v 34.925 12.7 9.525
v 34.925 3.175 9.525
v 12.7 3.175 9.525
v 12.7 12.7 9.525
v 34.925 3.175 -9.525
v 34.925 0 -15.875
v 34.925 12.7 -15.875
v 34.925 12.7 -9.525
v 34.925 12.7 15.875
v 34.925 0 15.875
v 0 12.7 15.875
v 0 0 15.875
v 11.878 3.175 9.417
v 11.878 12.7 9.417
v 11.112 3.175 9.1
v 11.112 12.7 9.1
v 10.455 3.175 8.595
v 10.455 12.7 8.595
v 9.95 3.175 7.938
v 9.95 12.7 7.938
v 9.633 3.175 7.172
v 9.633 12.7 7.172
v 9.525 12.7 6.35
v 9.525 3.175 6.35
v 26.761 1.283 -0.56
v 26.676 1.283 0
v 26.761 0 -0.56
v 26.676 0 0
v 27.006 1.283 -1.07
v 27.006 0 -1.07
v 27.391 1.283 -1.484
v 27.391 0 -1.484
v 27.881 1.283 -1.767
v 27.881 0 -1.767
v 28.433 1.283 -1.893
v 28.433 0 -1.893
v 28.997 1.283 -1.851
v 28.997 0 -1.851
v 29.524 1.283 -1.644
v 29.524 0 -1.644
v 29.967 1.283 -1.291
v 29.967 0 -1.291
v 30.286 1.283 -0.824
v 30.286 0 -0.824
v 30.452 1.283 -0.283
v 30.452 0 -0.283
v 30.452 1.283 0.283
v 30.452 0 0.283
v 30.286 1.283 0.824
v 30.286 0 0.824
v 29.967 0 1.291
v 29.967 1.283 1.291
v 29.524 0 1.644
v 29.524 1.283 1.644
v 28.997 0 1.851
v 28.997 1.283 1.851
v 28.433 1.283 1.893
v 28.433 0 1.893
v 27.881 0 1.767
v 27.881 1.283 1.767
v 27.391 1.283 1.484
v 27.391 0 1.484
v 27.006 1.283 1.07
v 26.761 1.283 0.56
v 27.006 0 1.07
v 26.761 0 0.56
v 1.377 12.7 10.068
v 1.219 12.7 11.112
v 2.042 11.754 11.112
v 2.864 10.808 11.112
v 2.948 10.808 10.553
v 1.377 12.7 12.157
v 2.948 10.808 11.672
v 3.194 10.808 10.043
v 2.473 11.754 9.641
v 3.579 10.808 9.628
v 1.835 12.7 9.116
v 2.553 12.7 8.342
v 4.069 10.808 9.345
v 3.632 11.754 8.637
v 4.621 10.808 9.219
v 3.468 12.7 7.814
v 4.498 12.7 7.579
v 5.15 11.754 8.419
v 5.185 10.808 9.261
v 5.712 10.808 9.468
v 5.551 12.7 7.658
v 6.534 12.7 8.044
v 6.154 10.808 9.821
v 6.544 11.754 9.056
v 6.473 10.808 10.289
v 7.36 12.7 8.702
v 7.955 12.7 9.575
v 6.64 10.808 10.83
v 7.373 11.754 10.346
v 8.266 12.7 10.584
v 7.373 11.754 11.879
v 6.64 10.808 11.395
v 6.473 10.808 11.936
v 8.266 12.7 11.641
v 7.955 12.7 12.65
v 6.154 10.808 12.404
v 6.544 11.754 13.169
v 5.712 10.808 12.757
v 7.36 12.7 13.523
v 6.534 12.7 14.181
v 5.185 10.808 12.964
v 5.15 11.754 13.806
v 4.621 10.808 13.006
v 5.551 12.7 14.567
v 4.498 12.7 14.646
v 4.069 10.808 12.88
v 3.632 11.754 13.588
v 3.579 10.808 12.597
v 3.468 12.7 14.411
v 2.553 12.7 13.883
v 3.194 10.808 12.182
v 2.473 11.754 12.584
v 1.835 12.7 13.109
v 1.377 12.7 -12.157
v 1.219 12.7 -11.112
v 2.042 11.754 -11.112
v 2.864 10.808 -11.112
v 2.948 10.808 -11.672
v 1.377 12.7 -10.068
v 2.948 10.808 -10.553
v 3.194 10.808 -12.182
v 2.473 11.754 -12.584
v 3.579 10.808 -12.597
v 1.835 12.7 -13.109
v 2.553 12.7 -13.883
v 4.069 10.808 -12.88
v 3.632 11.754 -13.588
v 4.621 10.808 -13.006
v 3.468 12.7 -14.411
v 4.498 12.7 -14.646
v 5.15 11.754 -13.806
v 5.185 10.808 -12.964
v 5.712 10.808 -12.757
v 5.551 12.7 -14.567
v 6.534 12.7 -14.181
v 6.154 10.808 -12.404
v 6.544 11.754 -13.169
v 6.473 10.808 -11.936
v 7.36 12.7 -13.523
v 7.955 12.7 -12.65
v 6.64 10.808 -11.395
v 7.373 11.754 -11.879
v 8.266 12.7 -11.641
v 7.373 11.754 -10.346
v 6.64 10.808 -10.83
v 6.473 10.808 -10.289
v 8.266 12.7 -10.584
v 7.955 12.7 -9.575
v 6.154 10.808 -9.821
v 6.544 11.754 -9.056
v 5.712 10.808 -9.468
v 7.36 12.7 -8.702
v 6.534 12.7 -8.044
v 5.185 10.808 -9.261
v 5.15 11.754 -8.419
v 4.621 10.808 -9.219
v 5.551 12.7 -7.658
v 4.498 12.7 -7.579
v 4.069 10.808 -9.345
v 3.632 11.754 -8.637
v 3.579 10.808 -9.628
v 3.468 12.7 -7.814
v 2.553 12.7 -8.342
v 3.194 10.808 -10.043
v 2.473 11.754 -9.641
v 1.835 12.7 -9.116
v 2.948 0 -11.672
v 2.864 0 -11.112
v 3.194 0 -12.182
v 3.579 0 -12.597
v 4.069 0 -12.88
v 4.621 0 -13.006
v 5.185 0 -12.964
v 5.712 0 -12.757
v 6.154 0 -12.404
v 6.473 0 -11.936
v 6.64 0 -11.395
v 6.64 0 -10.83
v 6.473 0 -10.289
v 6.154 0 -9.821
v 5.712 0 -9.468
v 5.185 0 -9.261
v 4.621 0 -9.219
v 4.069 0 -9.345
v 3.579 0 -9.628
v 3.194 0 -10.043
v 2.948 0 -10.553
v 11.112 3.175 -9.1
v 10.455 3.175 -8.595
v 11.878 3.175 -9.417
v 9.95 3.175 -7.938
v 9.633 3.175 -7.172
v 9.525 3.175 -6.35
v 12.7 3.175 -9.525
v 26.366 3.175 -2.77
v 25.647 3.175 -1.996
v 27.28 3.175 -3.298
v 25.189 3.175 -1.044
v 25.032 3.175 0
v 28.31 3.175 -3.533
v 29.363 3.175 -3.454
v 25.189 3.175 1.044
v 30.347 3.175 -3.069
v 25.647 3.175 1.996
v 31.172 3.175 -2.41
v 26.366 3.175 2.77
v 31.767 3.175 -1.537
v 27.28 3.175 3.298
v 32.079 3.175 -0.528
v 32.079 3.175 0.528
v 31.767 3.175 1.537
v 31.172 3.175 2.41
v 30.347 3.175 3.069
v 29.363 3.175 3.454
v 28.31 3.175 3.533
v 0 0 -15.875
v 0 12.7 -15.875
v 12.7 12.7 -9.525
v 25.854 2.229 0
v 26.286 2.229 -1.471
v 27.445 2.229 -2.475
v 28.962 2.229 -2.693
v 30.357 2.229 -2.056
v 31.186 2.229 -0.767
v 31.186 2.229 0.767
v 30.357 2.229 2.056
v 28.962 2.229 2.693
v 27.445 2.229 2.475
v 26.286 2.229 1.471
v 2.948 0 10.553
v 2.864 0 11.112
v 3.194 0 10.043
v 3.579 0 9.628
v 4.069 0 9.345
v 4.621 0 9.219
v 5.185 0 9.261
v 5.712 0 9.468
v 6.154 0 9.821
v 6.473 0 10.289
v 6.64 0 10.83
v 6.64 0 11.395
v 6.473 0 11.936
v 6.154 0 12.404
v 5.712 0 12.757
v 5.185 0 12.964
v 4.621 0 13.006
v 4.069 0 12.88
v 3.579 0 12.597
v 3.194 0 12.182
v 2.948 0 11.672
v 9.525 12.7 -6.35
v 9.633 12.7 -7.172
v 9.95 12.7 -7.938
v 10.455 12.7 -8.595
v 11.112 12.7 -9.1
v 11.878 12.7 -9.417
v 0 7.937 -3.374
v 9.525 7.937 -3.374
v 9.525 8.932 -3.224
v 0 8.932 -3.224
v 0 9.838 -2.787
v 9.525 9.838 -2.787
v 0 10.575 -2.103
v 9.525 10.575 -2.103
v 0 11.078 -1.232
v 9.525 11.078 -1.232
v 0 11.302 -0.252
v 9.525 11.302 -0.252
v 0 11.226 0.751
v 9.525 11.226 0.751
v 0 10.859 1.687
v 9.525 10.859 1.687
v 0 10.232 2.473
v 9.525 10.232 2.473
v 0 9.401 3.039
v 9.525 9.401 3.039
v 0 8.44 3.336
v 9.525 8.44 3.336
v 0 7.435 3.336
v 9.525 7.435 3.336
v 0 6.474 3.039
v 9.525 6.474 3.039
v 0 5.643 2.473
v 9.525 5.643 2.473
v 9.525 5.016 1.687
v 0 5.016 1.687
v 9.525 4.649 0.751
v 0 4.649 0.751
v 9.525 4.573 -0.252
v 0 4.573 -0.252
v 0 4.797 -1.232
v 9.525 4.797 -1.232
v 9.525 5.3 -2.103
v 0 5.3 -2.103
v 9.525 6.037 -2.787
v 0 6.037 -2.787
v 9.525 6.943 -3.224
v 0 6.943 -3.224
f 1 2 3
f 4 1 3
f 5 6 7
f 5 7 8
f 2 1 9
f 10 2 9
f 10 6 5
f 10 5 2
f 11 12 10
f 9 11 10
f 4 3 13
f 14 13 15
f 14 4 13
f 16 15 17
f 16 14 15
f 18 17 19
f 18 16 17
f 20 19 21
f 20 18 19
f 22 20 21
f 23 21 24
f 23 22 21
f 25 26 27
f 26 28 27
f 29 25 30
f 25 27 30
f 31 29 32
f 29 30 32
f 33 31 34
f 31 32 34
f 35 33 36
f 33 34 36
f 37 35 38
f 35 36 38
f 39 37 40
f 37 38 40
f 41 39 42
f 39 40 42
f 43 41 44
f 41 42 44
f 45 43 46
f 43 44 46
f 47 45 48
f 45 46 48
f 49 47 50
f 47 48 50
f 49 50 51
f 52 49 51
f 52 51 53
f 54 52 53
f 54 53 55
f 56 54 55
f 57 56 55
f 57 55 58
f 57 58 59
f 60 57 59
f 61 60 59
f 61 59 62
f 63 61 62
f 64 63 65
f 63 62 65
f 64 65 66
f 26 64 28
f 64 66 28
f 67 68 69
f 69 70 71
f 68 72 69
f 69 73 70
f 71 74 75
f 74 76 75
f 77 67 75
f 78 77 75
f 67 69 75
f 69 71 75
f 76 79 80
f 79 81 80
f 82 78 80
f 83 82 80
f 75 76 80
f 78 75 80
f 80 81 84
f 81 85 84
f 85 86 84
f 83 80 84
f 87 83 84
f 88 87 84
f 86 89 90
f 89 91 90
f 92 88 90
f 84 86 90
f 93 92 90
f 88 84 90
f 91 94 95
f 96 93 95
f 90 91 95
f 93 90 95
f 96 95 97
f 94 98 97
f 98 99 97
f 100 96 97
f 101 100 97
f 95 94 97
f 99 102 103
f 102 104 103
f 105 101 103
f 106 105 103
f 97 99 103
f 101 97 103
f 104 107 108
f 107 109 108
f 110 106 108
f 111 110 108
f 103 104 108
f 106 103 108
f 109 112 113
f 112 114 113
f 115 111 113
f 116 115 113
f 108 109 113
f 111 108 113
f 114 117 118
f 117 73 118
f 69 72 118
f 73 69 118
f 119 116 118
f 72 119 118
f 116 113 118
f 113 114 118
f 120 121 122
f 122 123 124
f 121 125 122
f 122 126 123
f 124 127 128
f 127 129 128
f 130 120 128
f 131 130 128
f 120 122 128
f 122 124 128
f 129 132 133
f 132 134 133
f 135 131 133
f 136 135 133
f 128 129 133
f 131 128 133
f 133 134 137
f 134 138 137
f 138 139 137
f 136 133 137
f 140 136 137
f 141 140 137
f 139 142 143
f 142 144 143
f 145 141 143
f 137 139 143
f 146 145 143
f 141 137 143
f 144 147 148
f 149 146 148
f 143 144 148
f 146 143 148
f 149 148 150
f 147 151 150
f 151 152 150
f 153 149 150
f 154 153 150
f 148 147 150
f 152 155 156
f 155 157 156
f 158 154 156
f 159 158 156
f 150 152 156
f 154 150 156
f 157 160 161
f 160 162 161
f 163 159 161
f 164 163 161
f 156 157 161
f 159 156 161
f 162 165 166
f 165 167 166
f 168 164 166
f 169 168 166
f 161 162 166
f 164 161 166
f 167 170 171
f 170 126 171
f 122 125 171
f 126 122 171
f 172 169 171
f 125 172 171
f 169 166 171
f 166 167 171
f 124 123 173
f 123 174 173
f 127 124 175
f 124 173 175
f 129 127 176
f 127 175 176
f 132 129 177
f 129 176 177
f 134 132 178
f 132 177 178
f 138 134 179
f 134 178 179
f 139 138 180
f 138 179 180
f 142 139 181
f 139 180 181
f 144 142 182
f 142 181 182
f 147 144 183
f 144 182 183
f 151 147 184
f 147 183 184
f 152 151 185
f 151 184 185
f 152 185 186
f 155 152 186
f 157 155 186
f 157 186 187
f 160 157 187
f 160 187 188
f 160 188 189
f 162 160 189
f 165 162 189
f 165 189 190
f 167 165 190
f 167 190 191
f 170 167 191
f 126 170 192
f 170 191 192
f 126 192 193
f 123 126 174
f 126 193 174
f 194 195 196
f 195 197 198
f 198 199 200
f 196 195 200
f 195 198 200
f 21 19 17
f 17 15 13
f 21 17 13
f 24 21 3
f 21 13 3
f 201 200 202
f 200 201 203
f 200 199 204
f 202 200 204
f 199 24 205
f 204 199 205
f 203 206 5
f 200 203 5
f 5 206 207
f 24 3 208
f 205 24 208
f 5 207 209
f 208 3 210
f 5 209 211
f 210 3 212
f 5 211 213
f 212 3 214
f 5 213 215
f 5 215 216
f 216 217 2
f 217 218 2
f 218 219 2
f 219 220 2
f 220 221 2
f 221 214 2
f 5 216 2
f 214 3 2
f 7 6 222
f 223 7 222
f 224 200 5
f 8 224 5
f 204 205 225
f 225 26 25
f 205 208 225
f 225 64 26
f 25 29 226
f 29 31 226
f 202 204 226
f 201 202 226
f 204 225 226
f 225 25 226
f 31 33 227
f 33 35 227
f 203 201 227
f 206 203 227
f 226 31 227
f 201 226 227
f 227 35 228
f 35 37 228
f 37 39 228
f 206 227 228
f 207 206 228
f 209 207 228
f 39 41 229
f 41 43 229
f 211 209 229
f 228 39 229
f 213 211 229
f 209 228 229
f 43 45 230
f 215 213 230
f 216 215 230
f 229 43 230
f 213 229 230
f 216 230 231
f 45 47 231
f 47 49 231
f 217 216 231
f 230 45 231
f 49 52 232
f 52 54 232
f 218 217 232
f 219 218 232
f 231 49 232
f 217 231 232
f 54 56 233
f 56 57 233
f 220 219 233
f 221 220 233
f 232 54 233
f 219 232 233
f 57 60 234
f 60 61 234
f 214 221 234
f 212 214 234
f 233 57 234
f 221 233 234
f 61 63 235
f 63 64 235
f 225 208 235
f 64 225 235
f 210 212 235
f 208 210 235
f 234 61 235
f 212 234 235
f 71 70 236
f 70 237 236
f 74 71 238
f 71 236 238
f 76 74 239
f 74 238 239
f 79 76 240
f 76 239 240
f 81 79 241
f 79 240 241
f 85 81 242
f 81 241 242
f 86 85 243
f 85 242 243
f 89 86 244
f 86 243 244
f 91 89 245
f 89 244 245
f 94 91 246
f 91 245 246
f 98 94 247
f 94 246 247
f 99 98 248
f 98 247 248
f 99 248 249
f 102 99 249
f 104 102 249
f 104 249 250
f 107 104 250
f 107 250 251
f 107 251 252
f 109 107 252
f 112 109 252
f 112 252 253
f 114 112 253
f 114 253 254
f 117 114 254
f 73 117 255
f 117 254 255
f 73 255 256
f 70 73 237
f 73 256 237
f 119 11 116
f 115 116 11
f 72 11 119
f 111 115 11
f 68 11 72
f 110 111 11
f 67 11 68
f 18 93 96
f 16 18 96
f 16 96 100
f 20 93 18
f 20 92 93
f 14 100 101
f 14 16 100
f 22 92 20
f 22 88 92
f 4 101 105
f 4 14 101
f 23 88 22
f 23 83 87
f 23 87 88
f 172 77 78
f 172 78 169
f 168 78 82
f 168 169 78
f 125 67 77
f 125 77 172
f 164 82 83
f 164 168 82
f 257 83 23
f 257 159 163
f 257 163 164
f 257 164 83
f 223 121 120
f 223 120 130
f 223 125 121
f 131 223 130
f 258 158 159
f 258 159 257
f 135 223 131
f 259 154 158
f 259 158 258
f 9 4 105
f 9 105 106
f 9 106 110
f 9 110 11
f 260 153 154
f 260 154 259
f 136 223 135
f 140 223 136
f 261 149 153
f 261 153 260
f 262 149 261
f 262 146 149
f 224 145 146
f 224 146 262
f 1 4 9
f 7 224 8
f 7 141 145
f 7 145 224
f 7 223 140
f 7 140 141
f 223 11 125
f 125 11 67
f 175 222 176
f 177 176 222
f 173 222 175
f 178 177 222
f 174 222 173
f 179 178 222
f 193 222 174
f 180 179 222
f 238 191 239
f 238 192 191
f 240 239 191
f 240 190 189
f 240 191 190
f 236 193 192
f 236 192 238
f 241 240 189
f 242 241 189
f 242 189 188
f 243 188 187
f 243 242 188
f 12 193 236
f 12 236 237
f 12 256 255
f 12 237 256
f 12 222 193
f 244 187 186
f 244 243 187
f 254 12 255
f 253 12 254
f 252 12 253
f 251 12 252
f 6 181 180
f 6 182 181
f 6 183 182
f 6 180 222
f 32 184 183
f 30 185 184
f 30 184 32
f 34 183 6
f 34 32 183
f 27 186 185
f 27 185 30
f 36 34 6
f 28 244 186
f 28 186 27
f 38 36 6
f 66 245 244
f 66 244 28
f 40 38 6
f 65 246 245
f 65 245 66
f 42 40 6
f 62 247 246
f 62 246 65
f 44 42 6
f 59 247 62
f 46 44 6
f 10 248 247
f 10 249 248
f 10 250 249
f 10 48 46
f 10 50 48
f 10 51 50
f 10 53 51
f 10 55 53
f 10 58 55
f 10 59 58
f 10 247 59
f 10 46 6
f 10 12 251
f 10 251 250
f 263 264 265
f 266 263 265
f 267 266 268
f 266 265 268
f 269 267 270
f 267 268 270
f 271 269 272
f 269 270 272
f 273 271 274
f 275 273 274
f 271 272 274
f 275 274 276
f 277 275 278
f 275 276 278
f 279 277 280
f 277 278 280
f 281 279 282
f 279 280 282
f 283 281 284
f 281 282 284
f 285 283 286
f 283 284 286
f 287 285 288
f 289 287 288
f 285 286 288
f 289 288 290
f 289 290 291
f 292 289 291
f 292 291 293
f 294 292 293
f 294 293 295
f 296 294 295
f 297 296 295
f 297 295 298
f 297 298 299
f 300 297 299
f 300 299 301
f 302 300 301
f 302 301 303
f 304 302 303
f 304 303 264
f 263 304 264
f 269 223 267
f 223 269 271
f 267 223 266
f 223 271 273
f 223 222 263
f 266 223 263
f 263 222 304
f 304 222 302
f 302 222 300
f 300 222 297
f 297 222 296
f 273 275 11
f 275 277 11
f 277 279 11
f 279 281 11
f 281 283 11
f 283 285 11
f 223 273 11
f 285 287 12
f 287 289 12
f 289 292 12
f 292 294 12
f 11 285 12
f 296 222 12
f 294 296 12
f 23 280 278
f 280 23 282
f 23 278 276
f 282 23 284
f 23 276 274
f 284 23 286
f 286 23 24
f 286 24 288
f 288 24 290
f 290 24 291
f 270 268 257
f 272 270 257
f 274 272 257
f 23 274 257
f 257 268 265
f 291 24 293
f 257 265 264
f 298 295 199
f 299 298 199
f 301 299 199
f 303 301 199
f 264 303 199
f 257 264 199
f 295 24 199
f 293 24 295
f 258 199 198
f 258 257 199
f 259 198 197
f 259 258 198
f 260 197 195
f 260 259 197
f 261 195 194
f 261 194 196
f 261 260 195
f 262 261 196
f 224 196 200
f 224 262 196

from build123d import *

# Parameters (mm, degrees)
BOSS_EXTRUDE1_DEPTH                            = 12.7
SKETCH2_W                                      = 25.4
SKETCH2_H                                      = 19.05
BOSS_EXTRUDE2_DEPTH                            = 3.175
FILLET1_R                                      = 3.175
F_17_64_0_26563_DIAMETER_HOLE1_D               = 6.747002
CSK_FOR_6_FLAT_HEAD_MACHINE_SCREW1_D           = 3.7973
CSK_FOR_6_FLAT_HEAD_MACHINE_SCREW1_DEPTH       = 16.51
CSK_FOR_6_FLAT_HEAD_MACHINE_SCREW1_CSINK_D     = 7.0866
CSK_FOR_6_FLAT_HEAD_MACHINE_SCREW1_CSINK_ANGLE = 82
CSK_FOR_6_FLAT_HEAD_MACHINE_SCREW1_TIP         = 1.140824014
CSK_FOR_6_FLAT_HEAD_MACHINE_SCREW2_D           = 3.7973
CSK_FOR_6_FLAT_HEAD_MACHINE_SCREW2_DEPTH       = 16.51
CSK_FOR_6_FLAT_HEAD_MACHINE_SCREW2_CSINK_D     = 7.0866
CSK_FOR_6_FLAT_HEAD_MACHINE_SCREW2_CSINK_ANGLE = 82
CSK_FOR_6_FLAT_HEAD_MACHINE_SCREW2_TIP         = 1.140824014


with BuildPart() as part:
    # Sketch1 → Boss-Extrude1 (new body)
    with BuildSketch(Plane(origin=(0, 0, 0), x_dir=(1, 0, 0), z_dir=(0, 1, 0))):
        Polygon((0, 15.875), (0, -15.875), (34.925, -15.875), (34.925, -9.525), (9.525, -9.525), (9.525, 9.525), (34.925, 9.525), (34.925, 15.875), align=None)
    extrude(amount=BOSS_EXTRUDE1_DEPTH)

    # Sketch2 → Boss-Extrude2 (add)
    with BuildSketch(Plane.XZ):
        with Locations((22.225, 0)):
            Rectangle(SKETCH2_W, SKETCH2_H)
    extrude(amount=-BOSS_EXTRUDE2_DEPTH)

    # Fillet1
    fillet1_edges = [part.edges().sort_by_distance(p)[0] for p in [
        (9.525, 7.9375, -9.525),
        (9.525, 7.9375, 9.525),
    ]]
    fillet(fillet1_edges, radius=FILLET1_R)

    # 17/64 (0.26563) Diameter Hole1 (through all)
    with Locations(Plane.ZY):
        with Locations((0, 7.9375)):
            Hole(F_17_64_0_26563_DIAMETER_HOLE1_D / 2)

    # CSK for #6 Flat Head Machine Screw1
    with Locations(Plane(origin=(0, 12.7, 0), x_dir=(1, 0, 0), z_dir=(0, 1, 0))):
        with Locations((4.7625, -11.1125), (4.7625, 11.1125)):
            CounterSinkHole(CSK_FOR_6_FLAT_HEAD_MACHINE_SCREW1_D / 2, CSK_FOR_6_FLAT_HEAD_MACHINE_SCREW1_CSINK_D / 2, depth=CSK_FOR_6_FLAT_HEAD_MACHINE_SCREW1_DEPTH, counter_sink_angle=CSK_FOR_6_FLAT_HEAD_MACHINE_SCREW1_CSINK_ANGLE)
            with Locations((0, 0, -(CSK_FOR_6_FLAT_HEAD_MACHINE_SCREW1_DEPTH + CSK_FOR_6_FLAT_HEAD_MACHINE_SCREW1_TIP / 2))):  # 118° drill point
                Cone(0, CSK_FOR_6_FLAT_HEAD_MACHINE_SCREW1_D / 2, CSK_FOR_6_FLAT_HEAD_MACHINE_SCREW1_TIP, mode=Mode.SUBTRACT)

    # CSK for #6 Flat Head Machine Screw2
    with Locations(Plane(origin=(0, 3.175, 0), x_dir=(1, 0, 0), z_dir=(0, 1, 0))):
        with Locations((28.575, 0)):
            CounterSinkHole(CSK_FOR_6_FLAT_HEAD_MACHINE_SCREW2_D / 2, CSK_FOR_6_FLAT_HEAD_MACHINE_SCREW2_CSINK_D / 2, depth=CSK_FOR_6_FLAT_HEAD_MACHINE_SCREW2_DEPTH, counter_sink_angle=CSK_FOR_6_FLAT_HEAD_MACHINE_SCREW2_CSINK_ANGLE)
            with Locations((0, 0, -(CSK_FOR_6_FLAT_HEAD_MACHINE_SCREW2_DEPTH + CSK_FOR_6_FLAT_HEAD_MACHINE_SCREW2_TIP / 2))):  # 118° drill point
                Cone(0, CSK_FOR_6_FLAT_HEAD_MACHINE_SCREW2_D / 2, CSK_FOR_6_FLAT_HEAD_MACHINE_SCREW2_TIP, mode=Mode.SUBTRACT)


solid = part.part
